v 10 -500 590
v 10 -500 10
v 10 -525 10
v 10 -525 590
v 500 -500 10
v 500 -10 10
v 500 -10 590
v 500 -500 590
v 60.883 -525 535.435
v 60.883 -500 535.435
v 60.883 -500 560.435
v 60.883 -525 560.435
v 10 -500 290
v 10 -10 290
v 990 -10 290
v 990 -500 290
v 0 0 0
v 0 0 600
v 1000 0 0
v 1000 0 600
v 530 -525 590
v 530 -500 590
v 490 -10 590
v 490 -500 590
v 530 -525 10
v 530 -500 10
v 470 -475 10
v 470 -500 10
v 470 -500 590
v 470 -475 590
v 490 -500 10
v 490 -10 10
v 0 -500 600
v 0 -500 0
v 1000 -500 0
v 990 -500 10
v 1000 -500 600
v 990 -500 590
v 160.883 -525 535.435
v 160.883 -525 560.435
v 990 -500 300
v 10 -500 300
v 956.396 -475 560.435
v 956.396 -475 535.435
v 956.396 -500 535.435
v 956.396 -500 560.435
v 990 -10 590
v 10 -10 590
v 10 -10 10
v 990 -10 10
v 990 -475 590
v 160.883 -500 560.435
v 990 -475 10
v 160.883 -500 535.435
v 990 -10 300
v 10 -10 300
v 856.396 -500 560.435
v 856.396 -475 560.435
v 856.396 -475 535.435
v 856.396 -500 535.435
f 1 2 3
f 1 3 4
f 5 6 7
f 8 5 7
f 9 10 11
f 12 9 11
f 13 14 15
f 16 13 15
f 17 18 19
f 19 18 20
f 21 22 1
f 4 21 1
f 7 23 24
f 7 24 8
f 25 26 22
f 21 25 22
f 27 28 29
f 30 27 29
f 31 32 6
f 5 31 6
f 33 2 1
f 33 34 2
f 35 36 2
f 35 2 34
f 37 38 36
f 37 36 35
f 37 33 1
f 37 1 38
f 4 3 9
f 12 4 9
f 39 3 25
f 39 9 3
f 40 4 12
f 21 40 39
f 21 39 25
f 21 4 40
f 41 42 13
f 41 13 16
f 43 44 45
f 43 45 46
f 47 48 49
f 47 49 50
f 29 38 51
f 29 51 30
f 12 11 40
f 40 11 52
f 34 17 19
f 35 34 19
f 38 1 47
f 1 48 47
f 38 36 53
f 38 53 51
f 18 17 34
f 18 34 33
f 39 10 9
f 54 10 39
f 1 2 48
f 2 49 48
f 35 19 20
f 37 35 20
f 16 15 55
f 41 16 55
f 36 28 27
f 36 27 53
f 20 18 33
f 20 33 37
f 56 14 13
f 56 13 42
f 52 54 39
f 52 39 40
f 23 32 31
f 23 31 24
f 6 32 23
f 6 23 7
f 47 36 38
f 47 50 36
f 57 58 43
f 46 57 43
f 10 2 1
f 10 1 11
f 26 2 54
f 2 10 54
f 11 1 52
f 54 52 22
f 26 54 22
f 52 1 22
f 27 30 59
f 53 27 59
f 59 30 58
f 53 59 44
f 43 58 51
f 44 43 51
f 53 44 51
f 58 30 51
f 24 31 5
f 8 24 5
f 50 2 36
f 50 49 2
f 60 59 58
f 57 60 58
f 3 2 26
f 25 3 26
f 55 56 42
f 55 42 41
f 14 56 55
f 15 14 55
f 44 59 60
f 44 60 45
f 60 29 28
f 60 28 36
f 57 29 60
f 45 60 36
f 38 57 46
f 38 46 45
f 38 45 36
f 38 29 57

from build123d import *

# Parameters (mm, degrees)
F0_W          = 1000
F0_H          = 600
F1_DEPTH      = 500
F2_T          = -10
F3_W          = 460
F3_H          = 580
F3_W_2        = 60
F4_DEPTH      = 25
F5_DEPTH      = 25
F6_W          = 100
F6_H          = 25
F7_DEPTH      = 525.001
F7_DEPTH_BACK = 1899
F8_W          = 980
F8_H          = 10
F9_DEPTH      = 490
F10_W         = 10
F10_H         = 580
F11_DEPTH     = 490


# Not quite as in the source:
# - an extrude ends at something that could not be found from the text; its depth is read off the source's solid


with BuildPart() as f1:
    # F0 (on Front) → F1 (new body)
    with BuildSketch(Plane.XZ):
        with Locations((500, 300)):
            Rectangle(F0_W, F0_H)
    extrude(amount=F1_DEPTH)

    # F2
    f2_openings = [f1.faces().sort_by_distance(p)[0] for p in [
        (500, -500, 300),
    ]]
    offset(amount=F2_T, openings=f2_openings)


with BuildPart() as f4:
    # F3 (on face) → F4 (new body)
    with BuildSketch(Plane.XZ.offset(500)):
        with Locations((240, 300)):
            Rectangle(F3_W, F3_H)
        with Locations((500, 300)):
            Rectangle(F3_W_2, F3_H)
    extrude(amount=F4_DEPTH)


with BuildPart() as f5:
    # F3 (on face) → F5 (new body)
    with BuildSketch(Plane.XZ.offset(500)):
        with Locations((760, 300)):
            Rectangle(F3_W, F3_H)
        with Locations((500, 300)):
            Rectangle(F3_W_2, F3_H)
    extrude(amount=-F5_DEPTH)


with BuildPart() as f7_tool:
    # F6 (on face) → F7 (new body, two sides)
    with BuildSketch(Plane.XZ.offset(525)) as f7_sk:
        with Locations((110.8831882477, 547.9354381561)):
            Rectangle(F6_W, F6_H)
        with Locations((906.3955426216, 547.9354381561)):
            Rectangle(F6_W, F6_H)
    extrude(amount=-F7_DEPTH)
    extrude(f7_sk.sketch, amount=F7_DEPTH_BACK)


with BuildPart() as f4_1:
    add(f4.part)

    # F7: cut by f7_tool
    add(f7_tool.part, mode=Mode.SUBTRACT)


with BuildPart() as f5_1:
    add(f5.part)

    # F7: cut by f7_tool
    add(f7_tool.part, mode=Mode.SUBTRACT)


with BuildPart() as f9:
    # F8 (on face) → F9 (new body, through all)
    with BuildSketch(Plane.XZ.offset(10)):
        with Locations((500, 295)):
            Rectangle(F8_W, F8_H)
    extrude(amount=F9_DEPTH)


with BuildPart() as f11:
    # F10 (on face) → F11 (new body, through all)
    with BuildSketch(Plane.XZ.offset(10)):
        with Locations((495, 300)):
            Rectangle(F10_W, F10_H)
    extrude(amount=F11_DEPTH)


solid = Compound([f1.part, f4_1.part, f5_1.part, f9.part, f11.part])
